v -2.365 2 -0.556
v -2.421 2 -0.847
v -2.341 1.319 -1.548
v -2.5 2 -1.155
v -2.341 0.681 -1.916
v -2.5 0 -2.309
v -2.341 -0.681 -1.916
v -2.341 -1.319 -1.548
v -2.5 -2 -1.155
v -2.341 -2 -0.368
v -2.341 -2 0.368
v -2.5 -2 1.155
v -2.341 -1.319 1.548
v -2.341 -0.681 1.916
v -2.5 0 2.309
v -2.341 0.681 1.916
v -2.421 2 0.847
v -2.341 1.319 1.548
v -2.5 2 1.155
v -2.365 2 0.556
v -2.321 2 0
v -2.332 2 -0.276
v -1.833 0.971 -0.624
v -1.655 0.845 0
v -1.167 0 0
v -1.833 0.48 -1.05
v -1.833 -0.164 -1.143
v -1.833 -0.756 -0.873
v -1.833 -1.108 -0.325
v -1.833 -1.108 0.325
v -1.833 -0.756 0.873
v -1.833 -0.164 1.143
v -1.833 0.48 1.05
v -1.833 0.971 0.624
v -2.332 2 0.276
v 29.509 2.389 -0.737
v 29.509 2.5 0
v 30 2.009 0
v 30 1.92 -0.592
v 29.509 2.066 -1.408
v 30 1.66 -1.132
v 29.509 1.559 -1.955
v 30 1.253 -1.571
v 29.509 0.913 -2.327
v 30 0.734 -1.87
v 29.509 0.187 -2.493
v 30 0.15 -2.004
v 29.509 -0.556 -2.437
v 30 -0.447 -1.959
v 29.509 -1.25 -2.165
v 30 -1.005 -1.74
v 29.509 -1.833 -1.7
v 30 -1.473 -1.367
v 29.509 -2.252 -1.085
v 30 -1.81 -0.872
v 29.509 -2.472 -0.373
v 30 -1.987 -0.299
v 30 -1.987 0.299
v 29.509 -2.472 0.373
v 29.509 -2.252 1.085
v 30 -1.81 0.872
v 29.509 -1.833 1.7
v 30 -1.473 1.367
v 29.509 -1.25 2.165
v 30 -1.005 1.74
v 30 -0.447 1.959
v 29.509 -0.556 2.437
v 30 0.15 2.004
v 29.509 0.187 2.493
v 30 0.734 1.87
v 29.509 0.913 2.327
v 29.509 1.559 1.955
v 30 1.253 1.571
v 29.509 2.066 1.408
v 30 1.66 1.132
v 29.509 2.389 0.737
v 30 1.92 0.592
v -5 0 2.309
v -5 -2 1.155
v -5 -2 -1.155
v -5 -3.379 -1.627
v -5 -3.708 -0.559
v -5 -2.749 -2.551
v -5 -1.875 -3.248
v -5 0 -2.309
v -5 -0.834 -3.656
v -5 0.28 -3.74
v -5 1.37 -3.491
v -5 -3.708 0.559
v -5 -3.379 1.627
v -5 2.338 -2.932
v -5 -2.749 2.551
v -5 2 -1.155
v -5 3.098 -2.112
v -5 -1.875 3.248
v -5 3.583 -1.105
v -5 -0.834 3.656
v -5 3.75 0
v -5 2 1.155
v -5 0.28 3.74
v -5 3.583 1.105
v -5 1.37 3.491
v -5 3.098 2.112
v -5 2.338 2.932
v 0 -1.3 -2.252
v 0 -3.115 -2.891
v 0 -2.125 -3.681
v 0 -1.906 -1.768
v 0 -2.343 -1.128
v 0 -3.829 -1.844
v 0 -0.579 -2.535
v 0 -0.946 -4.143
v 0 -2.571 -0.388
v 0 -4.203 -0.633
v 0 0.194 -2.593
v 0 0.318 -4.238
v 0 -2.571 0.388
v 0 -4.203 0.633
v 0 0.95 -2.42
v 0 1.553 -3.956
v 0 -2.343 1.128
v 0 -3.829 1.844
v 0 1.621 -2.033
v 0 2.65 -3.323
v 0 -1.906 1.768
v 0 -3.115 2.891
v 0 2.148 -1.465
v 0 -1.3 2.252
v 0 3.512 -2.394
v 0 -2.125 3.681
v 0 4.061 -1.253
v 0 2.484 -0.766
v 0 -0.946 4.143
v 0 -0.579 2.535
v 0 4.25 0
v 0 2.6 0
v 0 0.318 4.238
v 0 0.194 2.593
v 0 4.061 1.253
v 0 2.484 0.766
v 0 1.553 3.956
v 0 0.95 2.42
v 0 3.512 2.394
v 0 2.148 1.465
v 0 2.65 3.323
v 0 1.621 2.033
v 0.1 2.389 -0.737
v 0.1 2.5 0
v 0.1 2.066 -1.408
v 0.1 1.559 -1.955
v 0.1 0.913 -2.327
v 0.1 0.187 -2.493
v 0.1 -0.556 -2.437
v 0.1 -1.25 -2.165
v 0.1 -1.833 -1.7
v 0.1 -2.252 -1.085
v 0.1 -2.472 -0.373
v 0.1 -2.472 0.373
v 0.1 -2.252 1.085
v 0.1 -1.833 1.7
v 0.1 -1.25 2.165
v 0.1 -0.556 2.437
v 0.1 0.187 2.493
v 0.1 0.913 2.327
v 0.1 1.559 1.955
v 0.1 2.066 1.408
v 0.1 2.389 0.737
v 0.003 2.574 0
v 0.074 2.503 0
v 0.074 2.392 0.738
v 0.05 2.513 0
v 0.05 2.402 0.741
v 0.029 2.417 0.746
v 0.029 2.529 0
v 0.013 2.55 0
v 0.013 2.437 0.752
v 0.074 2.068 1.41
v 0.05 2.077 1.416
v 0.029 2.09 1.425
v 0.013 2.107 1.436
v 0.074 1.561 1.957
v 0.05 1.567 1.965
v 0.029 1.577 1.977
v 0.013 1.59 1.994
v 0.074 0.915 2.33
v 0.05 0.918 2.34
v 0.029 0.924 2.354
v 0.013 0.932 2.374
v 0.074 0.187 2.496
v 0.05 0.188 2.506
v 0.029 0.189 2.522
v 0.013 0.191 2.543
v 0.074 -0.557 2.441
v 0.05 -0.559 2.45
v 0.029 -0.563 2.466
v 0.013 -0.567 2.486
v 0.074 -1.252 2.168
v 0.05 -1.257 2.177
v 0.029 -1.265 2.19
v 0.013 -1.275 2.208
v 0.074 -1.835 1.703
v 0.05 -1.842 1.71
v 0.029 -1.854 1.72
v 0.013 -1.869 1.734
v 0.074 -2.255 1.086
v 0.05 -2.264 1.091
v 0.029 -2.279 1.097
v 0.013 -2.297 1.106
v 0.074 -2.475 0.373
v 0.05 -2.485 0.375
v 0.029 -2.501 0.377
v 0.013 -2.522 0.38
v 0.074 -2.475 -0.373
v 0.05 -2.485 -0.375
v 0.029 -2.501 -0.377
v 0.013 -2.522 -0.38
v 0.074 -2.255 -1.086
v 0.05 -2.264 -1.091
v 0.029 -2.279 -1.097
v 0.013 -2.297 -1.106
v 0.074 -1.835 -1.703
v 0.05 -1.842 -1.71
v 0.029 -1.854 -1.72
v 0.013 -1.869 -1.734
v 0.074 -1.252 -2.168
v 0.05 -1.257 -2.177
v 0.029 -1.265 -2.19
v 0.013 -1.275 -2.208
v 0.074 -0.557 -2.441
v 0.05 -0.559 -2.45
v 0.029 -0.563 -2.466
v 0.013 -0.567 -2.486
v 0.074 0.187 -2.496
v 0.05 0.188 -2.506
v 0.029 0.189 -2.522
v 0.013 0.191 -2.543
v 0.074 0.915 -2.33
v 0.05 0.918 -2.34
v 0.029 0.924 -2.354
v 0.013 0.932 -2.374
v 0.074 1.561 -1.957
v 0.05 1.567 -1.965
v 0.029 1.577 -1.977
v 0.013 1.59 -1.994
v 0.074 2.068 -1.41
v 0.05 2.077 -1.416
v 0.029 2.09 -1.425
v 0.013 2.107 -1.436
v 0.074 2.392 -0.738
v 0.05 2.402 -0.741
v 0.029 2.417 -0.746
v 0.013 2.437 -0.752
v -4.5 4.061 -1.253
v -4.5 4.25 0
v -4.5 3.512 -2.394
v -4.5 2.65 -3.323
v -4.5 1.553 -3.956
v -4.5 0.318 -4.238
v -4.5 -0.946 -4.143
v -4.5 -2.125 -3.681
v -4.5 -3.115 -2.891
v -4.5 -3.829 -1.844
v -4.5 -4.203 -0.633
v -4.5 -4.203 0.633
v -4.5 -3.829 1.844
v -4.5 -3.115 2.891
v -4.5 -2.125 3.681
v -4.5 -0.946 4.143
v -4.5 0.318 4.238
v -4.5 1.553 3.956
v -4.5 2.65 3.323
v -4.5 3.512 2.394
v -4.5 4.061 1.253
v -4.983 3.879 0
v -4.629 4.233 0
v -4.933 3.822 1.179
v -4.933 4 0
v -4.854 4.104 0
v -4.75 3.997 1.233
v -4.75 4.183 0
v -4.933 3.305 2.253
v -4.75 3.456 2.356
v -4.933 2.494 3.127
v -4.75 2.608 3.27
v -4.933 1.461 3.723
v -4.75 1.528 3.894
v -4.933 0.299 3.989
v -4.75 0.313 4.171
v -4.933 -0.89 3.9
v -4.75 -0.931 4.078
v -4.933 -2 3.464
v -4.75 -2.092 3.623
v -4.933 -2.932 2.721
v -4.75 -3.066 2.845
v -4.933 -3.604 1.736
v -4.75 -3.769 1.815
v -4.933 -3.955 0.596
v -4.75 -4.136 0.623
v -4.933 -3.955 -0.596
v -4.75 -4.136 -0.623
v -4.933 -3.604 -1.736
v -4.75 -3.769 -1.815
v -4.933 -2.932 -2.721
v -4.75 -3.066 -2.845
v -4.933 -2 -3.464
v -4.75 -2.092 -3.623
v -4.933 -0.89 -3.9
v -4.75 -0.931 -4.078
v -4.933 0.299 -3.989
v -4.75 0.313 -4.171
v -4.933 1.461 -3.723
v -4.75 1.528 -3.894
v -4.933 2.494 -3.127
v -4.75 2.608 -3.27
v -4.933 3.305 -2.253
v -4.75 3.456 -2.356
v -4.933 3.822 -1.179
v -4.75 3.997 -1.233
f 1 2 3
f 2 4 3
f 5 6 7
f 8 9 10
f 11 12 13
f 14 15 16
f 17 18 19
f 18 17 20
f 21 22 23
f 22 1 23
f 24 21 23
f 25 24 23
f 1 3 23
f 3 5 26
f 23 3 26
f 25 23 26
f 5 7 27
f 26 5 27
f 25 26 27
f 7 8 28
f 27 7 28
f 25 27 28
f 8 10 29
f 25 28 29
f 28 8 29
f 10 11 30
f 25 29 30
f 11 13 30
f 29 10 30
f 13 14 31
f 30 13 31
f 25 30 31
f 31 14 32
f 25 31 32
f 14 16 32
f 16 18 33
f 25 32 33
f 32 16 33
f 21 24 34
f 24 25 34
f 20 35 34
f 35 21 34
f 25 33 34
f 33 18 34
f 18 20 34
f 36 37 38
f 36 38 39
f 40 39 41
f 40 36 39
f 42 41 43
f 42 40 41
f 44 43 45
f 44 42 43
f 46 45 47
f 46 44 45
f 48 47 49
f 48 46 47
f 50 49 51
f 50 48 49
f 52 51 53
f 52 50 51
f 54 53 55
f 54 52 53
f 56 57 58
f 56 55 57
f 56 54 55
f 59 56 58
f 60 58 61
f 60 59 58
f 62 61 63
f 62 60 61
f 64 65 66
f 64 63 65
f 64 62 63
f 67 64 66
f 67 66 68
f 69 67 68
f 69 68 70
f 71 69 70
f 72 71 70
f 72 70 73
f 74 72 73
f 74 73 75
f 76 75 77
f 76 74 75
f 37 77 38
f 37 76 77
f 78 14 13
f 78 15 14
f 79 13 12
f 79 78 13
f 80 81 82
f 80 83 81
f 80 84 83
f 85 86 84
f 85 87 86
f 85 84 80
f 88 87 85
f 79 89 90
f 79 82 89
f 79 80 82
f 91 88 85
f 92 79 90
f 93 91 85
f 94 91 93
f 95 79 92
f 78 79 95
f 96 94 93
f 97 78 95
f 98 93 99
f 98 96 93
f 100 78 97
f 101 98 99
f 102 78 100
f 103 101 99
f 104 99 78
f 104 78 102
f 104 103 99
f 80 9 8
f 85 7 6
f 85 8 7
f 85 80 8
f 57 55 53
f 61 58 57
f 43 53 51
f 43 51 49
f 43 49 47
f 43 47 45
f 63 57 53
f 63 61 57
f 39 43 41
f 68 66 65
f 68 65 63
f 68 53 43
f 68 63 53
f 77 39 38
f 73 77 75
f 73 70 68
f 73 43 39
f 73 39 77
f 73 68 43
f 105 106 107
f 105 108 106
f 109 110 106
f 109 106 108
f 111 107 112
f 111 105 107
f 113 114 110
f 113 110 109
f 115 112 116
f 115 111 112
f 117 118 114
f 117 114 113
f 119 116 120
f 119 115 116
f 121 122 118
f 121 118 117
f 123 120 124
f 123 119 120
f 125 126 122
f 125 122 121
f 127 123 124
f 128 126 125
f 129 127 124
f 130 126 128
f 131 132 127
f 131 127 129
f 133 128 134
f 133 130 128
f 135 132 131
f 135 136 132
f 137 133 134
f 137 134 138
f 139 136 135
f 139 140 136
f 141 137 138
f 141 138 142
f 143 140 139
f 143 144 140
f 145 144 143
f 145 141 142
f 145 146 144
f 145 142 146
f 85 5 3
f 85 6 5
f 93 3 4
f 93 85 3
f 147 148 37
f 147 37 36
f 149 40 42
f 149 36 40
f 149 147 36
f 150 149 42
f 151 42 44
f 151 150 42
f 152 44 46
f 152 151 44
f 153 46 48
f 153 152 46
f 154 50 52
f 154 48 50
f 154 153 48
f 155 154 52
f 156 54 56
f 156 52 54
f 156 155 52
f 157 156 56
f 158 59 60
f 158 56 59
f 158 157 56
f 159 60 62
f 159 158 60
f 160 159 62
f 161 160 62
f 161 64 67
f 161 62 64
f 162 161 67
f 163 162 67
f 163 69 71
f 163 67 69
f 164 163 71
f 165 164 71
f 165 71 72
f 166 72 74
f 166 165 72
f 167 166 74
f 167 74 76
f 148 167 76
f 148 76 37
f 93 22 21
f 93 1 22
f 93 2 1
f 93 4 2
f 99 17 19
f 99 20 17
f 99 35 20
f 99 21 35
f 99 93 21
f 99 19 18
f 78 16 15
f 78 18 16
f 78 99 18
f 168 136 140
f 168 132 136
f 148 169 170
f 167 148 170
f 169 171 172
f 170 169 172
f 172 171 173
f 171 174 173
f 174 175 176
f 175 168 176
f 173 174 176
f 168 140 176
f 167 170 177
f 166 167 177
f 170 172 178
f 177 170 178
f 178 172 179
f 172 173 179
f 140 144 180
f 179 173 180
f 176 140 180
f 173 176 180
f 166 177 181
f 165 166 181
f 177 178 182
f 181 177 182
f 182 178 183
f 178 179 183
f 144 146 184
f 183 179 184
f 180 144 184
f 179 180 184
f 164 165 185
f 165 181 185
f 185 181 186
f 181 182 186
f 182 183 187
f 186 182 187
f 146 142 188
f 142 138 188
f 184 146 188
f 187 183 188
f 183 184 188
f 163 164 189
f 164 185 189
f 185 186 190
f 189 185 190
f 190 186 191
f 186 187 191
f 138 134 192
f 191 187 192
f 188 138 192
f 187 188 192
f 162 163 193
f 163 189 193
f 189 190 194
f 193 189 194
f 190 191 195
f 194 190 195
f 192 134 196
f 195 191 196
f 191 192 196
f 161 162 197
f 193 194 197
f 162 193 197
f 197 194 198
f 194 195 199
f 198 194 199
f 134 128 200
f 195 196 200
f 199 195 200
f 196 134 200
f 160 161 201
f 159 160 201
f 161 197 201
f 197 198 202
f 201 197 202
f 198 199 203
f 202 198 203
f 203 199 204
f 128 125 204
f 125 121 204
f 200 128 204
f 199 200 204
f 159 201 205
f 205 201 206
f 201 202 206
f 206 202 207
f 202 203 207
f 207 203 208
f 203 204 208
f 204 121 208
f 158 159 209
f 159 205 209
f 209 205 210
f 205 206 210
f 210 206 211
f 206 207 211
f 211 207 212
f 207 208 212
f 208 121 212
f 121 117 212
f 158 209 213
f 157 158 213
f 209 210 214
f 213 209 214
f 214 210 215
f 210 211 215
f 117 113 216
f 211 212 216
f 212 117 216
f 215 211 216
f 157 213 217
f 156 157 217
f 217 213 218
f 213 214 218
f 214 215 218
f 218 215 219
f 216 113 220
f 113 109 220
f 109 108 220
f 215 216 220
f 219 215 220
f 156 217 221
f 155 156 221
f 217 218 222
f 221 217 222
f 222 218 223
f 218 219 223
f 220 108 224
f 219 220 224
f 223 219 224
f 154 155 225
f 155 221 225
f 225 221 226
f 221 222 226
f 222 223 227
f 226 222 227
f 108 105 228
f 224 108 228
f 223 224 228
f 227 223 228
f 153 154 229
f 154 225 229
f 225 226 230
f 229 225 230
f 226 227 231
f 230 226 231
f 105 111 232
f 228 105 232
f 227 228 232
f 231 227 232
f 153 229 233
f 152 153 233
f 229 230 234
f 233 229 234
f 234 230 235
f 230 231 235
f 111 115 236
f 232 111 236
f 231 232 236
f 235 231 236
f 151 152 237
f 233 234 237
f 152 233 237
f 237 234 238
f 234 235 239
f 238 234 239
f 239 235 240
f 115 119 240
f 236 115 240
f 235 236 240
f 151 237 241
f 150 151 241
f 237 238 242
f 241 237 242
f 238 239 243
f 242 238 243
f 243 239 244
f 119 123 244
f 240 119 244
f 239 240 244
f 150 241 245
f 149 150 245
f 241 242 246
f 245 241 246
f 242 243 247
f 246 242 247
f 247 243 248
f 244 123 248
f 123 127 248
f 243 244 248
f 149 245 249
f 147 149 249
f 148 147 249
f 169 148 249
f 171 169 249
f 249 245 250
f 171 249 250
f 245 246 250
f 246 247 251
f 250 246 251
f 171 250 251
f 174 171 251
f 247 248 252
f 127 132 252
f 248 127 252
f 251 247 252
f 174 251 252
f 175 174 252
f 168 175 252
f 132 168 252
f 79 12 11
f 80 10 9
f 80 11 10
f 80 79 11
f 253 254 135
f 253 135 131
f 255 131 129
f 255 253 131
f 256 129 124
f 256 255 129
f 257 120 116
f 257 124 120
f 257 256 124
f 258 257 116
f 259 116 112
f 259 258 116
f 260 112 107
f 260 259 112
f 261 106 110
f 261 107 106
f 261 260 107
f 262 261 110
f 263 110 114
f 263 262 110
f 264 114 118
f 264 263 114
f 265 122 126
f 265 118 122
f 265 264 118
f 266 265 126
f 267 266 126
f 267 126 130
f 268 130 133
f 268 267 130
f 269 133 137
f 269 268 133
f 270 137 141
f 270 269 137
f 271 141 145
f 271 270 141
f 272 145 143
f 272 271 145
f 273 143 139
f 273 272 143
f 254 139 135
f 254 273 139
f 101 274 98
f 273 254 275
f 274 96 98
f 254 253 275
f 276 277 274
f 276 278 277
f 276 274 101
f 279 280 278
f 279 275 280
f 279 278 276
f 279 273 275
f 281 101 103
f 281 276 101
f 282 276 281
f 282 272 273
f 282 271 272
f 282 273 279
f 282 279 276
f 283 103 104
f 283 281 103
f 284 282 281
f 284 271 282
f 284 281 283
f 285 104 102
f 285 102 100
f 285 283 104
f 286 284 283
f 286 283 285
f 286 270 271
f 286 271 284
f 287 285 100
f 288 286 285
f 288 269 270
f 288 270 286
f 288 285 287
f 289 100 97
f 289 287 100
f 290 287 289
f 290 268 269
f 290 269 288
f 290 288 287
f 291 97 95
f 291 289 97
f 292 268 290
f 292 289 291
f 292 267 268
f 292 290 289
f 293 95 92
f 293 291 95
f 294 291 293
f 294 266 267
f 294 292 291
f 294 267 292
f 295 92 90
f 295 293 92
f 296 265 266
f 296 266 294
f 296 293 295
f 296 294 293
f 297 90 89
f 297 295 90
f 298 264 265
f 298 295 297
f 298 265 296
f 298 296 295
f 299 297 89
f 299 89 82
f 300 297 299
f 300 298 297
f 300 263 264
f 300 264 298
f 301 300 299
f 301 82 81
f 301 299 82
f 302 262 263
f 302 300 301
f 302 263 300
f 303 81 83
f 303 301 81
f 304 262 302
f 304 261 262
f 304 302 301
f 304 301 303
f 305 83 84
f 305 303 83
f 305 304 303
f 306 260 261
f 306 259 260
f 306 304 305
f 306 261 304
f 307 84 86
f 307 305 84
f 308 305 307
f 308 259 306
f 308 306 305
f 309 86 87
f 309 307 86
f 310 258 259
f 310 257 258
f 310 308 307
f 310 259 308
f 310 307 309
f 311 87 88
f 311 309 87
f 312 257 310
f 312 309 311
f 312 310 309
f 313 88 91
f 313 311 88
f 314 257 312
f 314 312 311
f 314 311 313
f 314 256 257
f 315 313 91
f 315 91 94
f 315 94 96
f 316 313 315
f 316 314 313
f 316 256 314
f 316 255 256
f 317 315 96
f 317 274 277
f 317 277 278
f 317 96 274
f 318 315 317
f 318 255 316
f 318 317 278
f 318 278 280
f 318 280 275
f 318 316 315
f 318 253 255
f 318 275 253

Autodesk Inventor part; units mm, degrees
ref_plane "YZ Plane" through (0, 0, 0) normal (1, 0, 0) x (0, 1, 0)
ref_plane "XZ Plane" through (0, 0, 0) normal (0, 1, 0) x (-1, 0, 0)
sketch "Sketch1" plane through (0, 0, 0) normal (0, 0, 1) x (1, 0, 0)
  line L0 (-1.1667, 0) -> (30, 0)
  line L1 (30, 0) -> (30, 2.5)
  line L2 (30, 2.5) -> (14, 2.5)
  line L3 (14, 2.5) -> (13.5091, 2.5)
  line L4 (13.5091, 2.5) -> (0, 2.5)
  line L5 (0, 2.5) -> (0, 4.25)
  line L6 (0, 4.25) -> (-5, 4.25)
  line L7 (-5, 4.25) -> (-5, 2.3094)
  line L8 (-5, 2.3094) -> (-2.5, 2.3094)
  line L9 (-2.5, 2.3094) -> (-1.1667, 0)
  line L10 (-12, 0) -> (37, 0) projected
  line L11 (0, -0.85) -> (0, 5.1) projected
  line L12 (14, 2.5) -> (0, 2.5) construction
  dimension "d1" = 16
  dimension "d2" = 0.4909
  dimension "d3" = 5
  dimension "d4" = 2.5
  dimension "d5" = 60
  dimension "d6" = 5
  dimension "d7" = 5
  dimension "d8" = 4.6188
  dimension "d9" = 8.5
  dimension "d26" = 30
revolve "Body" add sketch "Sketch1" angle 360 about axis through (-1.1667, 0, 0) along (1, 0, 0)
sketch "Sketch2" plane through (-5, 0, 0) normal (-1, 0, 0) x (0, 0, 1)
  circle A0 centre (0, 0) radius 2.3094 projected
  line L0 (0, -5.95) -> (0, 5.95) projected
  line L1 (-5.95, 0) -> (5.95, 0) projected
  line L2 (2.3094, 0) -> (1.1547, -2)
  line L3 (1.1547, -2) -> (-1.1547, -2)
  line L4 (-1.1547, -2) -> (-2.3094, 0)
  line L5 (-2.3094, 0) -> (-1.1547, 2)
  line L6 (-1.1547, 2) -> (1.1547, 2)
  line L7 (1.1547, 2) -> (2.3094, 0)
extrude "Slot" add sketch "Sketch2" against normal up to next contours L7 A0 | A0 L2 | L6 L0 A0 | A0 L0 L3 | L0 L6 A0 | A0 L3 L0 | L4 A0 | A0 L5
fillet "Fillet1" radius 0.5 1 edges at (-5, -4.25, 0)
thread "Thread" size "M5x0.8" class "6g" standard "ISO Metric profile" full length
chamfer "Chamfer1" distance 0.4908 distance2 0.4908 1 edges at (30, -2.5, 0) measured on face at (30, -0.5525, -0.0341)
ref_plane "Work Plane1" through (29, 0, 0) normal (0, -1, 0) x (1, 0, 0)
fillet "Fillet2" radius 0.1 1 edges at (0, -2.5, 0)
equation "\"d1\" = GEL"
equation "\"d3\" = KOH"
equation "\"d4\" = INTI"
equation "\"d6\" = GD"
equation "\"d7\" = BDM"
equation "\"d8\" = 1.1547 * SW"
equation "\"d9\" = KOD"
equation "\"d26\" = NLG"
equation "\"d30\" = R"
equation "\"d17\" = RR"
equation "\"d13\" = GEL"
equation "\"d15\" = -0.5 * SPD + 0.5 * GD"
equation "\"d16\" = GUL"
equation "\"GD\" = NND"
equation "\"NLG\" = 30"
equation "\"GEL\" = 16"
equation "\"KOD\" = 8.5"
equation "\"KOH\" = NND"
equation "\"INTI\" = 2.5"
equation "\"GAL\" = 0.61345 * PTC"
equation "\"GUL\" = 0.61345 * PTC"
equation "\"BDM\" = NND"
equation "\"SW\" = 4"
equation "\"RR\" = 0.1 * NND"
equation "\"SPD\" = NND - 1.2269 * PTC"
equation "\"R\" = 0.1"
equation "\"PHH\" = 0.13"
equation "\"GD1\" = THREADDIA - 1.2269 * PTC"
equation "\"THREADDIA\" = 5"
equation "\"FAWI\" = 45deg"
equation "\"PTC\" = 0.8"
equation "\"KOH1\" = 4.5"
equation "\"NND\" = 5"
equation "\"TOA\" = 30deg"
equation "\"E0\" = 1.155 * SW"
properties part number "AS 1420 - 1973 - M5 x 30" material "Steel, Mild"
